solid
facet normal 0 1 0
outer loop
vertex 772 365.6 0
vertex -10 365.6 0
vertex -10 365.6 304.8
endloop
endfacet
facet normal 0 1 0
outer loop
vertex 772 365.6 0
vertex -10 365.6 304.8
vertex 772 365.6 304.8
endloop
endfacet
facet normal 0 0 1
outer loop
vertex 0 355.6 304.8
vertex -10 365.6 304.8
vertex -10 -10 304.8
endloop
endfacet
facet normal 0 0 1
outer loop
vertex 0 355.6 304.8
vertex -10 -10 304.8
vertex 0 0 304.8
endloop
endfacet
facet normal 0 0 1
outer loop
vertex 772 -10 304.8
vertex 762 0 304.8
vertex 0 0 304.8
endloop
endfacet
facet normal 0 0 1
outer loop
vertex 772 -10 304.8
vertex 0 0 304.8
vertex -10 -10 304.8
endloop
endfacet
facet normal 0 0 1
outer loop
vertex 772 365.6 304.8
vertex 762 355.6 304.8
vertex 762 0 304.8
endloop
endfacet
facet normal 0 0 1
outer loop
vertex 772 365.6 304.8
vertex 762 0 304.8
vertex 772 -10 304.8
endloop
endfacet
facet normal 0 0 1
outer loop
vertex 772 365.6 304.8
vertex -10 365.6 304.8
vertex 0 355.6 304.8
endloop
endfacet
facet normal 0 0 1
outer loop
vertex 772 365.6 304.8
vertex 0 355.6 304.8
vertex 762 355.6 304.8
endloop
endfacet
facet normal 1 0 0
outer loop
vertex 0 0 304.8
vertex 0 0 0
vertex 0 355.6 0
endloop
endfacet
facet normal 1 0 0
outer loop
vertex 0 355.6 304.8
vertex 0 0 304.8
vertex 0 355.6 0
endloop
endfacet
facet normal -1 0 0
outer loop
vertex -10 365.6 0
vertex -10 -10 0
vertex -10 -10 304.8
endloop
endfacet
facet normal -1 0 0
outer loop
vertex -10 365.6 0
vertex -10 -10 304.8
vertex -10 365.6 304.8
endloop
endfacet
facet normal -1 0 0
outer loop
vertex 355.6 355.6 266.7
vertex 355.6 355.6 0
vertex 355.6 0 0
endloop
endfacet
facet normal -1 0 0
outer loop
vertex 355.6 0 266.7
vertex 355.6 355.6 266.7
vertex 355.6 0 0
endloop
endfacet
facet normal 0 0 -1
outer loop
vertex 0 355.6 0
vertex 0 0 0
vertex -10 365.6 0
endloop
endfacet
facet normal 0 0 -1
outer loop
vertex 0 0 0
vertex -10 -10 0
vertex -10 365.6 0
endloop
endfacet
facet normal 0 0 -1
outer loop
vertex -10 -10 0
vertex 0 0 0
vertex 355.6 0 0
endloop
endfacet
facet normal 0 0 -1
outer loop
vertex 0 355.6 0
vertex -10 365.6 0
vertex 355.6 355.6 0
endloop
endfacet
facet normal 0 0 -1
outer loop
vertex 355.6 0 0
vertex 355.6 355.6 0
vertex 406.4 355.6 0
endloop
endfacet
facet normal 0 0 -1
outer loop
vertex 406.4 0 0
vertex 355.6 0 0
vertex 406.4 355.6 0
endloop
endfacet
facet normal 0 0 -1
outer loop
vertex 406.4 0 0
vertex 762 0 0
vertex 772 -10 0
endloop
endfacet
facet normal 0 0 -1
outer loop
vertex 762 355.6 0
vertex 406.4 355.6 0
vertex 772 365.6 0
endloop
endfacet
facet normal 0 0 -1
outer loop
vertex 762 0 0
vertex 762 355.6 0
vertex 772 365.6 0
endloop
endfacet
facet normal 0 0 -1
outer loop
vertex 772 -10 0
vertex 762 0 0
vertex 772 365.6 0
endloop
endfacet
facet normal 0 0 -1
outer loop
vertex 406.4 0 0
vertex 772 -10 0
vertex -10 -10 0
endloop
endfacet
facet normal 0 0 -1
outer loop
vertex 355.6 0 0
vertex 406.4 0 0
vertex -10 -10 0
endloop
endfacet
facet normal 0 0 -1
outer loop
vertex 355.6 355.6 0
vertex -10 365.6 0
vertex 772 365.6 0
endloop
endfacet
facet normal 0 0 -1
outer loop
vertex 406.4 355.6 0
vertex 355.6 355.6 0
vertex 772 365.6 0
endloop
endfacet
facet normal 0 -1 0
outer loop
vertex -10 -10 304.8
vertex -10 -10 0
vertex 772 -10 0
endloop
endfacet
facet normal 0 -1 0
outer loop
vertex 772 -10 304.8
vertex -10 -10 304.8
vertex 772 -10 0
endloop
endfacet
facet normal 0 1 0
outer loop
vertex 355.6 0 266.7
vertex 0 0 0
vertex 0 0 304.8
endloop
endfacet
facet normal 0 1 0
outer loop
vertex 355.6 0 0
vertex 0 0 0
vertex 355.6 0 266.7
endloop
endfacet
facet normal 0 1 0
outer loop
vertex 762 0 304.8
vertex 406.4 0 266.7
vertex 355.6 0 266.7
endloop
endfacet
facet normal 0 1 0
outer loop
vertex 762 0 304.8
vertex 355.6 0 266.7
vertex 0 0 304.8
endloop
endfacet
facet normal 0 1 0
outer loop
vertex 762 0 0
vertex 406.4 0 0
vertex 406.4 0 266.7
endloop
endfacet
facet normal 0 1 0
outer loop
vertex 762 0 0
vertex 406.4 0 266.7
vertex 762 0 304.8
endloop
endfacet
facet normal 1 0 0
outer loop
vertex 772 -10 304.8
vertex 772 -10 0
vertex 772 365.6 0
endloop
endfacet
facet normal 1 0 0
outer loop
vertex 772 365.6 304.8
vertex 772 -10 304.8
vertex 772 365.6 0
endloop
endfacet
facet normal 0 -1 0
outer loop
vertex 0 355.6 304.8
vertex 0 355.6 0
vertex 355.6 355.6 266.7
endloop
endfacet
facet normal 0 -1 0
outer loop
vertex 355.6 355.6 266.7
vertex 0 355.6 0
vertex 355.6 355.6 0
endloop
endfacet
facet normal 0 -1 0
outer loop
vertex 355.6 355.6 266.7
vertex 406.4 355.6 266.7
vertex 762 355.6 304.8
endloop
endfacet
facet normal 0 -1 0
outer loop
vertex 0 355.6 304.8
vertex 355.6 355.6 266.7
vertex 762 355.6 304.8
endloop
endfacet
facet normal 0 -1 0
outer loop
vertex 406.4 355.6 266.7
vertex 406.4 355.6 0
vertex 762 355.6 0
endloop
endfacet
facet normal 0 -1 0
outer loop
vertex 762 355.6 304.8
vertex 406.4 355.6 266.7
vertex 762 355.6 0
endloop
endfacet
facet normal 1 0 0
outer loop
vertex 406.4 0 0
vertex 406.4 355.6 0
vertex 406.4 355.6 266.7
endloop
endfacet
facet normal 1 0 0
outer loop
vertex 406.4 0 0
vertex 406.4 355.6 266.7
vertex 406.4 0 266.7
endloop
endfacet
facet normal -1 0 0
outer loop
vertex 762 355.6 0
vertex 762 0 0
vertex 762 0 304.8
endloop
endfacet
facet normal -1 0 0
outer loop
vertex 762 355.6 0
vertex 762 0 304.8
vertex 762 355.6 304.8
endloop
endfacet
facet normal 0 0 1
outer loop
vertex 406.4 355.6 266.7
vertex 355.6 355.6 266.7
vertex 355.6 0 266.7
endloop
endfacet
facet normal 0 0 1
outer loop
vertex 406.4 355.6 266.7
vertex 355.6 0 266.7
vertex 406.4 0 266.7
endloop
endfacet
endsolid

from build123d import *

# Parameters (mm, degrees)
F1_W     = 782
F1_H     = 375.6
F2_DEPTH = 304.8
F0_W     = 762
F0_H     = 355.6
F3_DEPTH = 304.801
F4_W     = 50.8
F4_H     = 355.6
F5_DEPTH = 266.7


with BuildPart() as f2:
    # F1 (on Top) → F2 (new body)
    with BuildSketch(Plane.XY):
        with Locations((381, 177.8)):
            Rectangle(F1_W, F1_H)
    extrude(amount=F2_DEPTH)

    # F0 (on Top) → F3 (cut, through all)
    with BuildSketch(Plane.XY):
        with Locations((381, 177.8)):
            Rectangle(F0_W, F0_H)
    extrude(amount=F3_DEPTH, mode=Mode.SUBTRACT)

    # F4 (on face) → F5 (join)
    with BuildSketch(Plane(origin=(0, 0, 0), x_dir=(1, 0, 0), z_dir=(0, 0, -1))):
        with Locations((381, -177.8)):
            Rectangle(F4_W, F4_H)
    extrude(amount=-F5_DEPTH)


solid = f2.part
